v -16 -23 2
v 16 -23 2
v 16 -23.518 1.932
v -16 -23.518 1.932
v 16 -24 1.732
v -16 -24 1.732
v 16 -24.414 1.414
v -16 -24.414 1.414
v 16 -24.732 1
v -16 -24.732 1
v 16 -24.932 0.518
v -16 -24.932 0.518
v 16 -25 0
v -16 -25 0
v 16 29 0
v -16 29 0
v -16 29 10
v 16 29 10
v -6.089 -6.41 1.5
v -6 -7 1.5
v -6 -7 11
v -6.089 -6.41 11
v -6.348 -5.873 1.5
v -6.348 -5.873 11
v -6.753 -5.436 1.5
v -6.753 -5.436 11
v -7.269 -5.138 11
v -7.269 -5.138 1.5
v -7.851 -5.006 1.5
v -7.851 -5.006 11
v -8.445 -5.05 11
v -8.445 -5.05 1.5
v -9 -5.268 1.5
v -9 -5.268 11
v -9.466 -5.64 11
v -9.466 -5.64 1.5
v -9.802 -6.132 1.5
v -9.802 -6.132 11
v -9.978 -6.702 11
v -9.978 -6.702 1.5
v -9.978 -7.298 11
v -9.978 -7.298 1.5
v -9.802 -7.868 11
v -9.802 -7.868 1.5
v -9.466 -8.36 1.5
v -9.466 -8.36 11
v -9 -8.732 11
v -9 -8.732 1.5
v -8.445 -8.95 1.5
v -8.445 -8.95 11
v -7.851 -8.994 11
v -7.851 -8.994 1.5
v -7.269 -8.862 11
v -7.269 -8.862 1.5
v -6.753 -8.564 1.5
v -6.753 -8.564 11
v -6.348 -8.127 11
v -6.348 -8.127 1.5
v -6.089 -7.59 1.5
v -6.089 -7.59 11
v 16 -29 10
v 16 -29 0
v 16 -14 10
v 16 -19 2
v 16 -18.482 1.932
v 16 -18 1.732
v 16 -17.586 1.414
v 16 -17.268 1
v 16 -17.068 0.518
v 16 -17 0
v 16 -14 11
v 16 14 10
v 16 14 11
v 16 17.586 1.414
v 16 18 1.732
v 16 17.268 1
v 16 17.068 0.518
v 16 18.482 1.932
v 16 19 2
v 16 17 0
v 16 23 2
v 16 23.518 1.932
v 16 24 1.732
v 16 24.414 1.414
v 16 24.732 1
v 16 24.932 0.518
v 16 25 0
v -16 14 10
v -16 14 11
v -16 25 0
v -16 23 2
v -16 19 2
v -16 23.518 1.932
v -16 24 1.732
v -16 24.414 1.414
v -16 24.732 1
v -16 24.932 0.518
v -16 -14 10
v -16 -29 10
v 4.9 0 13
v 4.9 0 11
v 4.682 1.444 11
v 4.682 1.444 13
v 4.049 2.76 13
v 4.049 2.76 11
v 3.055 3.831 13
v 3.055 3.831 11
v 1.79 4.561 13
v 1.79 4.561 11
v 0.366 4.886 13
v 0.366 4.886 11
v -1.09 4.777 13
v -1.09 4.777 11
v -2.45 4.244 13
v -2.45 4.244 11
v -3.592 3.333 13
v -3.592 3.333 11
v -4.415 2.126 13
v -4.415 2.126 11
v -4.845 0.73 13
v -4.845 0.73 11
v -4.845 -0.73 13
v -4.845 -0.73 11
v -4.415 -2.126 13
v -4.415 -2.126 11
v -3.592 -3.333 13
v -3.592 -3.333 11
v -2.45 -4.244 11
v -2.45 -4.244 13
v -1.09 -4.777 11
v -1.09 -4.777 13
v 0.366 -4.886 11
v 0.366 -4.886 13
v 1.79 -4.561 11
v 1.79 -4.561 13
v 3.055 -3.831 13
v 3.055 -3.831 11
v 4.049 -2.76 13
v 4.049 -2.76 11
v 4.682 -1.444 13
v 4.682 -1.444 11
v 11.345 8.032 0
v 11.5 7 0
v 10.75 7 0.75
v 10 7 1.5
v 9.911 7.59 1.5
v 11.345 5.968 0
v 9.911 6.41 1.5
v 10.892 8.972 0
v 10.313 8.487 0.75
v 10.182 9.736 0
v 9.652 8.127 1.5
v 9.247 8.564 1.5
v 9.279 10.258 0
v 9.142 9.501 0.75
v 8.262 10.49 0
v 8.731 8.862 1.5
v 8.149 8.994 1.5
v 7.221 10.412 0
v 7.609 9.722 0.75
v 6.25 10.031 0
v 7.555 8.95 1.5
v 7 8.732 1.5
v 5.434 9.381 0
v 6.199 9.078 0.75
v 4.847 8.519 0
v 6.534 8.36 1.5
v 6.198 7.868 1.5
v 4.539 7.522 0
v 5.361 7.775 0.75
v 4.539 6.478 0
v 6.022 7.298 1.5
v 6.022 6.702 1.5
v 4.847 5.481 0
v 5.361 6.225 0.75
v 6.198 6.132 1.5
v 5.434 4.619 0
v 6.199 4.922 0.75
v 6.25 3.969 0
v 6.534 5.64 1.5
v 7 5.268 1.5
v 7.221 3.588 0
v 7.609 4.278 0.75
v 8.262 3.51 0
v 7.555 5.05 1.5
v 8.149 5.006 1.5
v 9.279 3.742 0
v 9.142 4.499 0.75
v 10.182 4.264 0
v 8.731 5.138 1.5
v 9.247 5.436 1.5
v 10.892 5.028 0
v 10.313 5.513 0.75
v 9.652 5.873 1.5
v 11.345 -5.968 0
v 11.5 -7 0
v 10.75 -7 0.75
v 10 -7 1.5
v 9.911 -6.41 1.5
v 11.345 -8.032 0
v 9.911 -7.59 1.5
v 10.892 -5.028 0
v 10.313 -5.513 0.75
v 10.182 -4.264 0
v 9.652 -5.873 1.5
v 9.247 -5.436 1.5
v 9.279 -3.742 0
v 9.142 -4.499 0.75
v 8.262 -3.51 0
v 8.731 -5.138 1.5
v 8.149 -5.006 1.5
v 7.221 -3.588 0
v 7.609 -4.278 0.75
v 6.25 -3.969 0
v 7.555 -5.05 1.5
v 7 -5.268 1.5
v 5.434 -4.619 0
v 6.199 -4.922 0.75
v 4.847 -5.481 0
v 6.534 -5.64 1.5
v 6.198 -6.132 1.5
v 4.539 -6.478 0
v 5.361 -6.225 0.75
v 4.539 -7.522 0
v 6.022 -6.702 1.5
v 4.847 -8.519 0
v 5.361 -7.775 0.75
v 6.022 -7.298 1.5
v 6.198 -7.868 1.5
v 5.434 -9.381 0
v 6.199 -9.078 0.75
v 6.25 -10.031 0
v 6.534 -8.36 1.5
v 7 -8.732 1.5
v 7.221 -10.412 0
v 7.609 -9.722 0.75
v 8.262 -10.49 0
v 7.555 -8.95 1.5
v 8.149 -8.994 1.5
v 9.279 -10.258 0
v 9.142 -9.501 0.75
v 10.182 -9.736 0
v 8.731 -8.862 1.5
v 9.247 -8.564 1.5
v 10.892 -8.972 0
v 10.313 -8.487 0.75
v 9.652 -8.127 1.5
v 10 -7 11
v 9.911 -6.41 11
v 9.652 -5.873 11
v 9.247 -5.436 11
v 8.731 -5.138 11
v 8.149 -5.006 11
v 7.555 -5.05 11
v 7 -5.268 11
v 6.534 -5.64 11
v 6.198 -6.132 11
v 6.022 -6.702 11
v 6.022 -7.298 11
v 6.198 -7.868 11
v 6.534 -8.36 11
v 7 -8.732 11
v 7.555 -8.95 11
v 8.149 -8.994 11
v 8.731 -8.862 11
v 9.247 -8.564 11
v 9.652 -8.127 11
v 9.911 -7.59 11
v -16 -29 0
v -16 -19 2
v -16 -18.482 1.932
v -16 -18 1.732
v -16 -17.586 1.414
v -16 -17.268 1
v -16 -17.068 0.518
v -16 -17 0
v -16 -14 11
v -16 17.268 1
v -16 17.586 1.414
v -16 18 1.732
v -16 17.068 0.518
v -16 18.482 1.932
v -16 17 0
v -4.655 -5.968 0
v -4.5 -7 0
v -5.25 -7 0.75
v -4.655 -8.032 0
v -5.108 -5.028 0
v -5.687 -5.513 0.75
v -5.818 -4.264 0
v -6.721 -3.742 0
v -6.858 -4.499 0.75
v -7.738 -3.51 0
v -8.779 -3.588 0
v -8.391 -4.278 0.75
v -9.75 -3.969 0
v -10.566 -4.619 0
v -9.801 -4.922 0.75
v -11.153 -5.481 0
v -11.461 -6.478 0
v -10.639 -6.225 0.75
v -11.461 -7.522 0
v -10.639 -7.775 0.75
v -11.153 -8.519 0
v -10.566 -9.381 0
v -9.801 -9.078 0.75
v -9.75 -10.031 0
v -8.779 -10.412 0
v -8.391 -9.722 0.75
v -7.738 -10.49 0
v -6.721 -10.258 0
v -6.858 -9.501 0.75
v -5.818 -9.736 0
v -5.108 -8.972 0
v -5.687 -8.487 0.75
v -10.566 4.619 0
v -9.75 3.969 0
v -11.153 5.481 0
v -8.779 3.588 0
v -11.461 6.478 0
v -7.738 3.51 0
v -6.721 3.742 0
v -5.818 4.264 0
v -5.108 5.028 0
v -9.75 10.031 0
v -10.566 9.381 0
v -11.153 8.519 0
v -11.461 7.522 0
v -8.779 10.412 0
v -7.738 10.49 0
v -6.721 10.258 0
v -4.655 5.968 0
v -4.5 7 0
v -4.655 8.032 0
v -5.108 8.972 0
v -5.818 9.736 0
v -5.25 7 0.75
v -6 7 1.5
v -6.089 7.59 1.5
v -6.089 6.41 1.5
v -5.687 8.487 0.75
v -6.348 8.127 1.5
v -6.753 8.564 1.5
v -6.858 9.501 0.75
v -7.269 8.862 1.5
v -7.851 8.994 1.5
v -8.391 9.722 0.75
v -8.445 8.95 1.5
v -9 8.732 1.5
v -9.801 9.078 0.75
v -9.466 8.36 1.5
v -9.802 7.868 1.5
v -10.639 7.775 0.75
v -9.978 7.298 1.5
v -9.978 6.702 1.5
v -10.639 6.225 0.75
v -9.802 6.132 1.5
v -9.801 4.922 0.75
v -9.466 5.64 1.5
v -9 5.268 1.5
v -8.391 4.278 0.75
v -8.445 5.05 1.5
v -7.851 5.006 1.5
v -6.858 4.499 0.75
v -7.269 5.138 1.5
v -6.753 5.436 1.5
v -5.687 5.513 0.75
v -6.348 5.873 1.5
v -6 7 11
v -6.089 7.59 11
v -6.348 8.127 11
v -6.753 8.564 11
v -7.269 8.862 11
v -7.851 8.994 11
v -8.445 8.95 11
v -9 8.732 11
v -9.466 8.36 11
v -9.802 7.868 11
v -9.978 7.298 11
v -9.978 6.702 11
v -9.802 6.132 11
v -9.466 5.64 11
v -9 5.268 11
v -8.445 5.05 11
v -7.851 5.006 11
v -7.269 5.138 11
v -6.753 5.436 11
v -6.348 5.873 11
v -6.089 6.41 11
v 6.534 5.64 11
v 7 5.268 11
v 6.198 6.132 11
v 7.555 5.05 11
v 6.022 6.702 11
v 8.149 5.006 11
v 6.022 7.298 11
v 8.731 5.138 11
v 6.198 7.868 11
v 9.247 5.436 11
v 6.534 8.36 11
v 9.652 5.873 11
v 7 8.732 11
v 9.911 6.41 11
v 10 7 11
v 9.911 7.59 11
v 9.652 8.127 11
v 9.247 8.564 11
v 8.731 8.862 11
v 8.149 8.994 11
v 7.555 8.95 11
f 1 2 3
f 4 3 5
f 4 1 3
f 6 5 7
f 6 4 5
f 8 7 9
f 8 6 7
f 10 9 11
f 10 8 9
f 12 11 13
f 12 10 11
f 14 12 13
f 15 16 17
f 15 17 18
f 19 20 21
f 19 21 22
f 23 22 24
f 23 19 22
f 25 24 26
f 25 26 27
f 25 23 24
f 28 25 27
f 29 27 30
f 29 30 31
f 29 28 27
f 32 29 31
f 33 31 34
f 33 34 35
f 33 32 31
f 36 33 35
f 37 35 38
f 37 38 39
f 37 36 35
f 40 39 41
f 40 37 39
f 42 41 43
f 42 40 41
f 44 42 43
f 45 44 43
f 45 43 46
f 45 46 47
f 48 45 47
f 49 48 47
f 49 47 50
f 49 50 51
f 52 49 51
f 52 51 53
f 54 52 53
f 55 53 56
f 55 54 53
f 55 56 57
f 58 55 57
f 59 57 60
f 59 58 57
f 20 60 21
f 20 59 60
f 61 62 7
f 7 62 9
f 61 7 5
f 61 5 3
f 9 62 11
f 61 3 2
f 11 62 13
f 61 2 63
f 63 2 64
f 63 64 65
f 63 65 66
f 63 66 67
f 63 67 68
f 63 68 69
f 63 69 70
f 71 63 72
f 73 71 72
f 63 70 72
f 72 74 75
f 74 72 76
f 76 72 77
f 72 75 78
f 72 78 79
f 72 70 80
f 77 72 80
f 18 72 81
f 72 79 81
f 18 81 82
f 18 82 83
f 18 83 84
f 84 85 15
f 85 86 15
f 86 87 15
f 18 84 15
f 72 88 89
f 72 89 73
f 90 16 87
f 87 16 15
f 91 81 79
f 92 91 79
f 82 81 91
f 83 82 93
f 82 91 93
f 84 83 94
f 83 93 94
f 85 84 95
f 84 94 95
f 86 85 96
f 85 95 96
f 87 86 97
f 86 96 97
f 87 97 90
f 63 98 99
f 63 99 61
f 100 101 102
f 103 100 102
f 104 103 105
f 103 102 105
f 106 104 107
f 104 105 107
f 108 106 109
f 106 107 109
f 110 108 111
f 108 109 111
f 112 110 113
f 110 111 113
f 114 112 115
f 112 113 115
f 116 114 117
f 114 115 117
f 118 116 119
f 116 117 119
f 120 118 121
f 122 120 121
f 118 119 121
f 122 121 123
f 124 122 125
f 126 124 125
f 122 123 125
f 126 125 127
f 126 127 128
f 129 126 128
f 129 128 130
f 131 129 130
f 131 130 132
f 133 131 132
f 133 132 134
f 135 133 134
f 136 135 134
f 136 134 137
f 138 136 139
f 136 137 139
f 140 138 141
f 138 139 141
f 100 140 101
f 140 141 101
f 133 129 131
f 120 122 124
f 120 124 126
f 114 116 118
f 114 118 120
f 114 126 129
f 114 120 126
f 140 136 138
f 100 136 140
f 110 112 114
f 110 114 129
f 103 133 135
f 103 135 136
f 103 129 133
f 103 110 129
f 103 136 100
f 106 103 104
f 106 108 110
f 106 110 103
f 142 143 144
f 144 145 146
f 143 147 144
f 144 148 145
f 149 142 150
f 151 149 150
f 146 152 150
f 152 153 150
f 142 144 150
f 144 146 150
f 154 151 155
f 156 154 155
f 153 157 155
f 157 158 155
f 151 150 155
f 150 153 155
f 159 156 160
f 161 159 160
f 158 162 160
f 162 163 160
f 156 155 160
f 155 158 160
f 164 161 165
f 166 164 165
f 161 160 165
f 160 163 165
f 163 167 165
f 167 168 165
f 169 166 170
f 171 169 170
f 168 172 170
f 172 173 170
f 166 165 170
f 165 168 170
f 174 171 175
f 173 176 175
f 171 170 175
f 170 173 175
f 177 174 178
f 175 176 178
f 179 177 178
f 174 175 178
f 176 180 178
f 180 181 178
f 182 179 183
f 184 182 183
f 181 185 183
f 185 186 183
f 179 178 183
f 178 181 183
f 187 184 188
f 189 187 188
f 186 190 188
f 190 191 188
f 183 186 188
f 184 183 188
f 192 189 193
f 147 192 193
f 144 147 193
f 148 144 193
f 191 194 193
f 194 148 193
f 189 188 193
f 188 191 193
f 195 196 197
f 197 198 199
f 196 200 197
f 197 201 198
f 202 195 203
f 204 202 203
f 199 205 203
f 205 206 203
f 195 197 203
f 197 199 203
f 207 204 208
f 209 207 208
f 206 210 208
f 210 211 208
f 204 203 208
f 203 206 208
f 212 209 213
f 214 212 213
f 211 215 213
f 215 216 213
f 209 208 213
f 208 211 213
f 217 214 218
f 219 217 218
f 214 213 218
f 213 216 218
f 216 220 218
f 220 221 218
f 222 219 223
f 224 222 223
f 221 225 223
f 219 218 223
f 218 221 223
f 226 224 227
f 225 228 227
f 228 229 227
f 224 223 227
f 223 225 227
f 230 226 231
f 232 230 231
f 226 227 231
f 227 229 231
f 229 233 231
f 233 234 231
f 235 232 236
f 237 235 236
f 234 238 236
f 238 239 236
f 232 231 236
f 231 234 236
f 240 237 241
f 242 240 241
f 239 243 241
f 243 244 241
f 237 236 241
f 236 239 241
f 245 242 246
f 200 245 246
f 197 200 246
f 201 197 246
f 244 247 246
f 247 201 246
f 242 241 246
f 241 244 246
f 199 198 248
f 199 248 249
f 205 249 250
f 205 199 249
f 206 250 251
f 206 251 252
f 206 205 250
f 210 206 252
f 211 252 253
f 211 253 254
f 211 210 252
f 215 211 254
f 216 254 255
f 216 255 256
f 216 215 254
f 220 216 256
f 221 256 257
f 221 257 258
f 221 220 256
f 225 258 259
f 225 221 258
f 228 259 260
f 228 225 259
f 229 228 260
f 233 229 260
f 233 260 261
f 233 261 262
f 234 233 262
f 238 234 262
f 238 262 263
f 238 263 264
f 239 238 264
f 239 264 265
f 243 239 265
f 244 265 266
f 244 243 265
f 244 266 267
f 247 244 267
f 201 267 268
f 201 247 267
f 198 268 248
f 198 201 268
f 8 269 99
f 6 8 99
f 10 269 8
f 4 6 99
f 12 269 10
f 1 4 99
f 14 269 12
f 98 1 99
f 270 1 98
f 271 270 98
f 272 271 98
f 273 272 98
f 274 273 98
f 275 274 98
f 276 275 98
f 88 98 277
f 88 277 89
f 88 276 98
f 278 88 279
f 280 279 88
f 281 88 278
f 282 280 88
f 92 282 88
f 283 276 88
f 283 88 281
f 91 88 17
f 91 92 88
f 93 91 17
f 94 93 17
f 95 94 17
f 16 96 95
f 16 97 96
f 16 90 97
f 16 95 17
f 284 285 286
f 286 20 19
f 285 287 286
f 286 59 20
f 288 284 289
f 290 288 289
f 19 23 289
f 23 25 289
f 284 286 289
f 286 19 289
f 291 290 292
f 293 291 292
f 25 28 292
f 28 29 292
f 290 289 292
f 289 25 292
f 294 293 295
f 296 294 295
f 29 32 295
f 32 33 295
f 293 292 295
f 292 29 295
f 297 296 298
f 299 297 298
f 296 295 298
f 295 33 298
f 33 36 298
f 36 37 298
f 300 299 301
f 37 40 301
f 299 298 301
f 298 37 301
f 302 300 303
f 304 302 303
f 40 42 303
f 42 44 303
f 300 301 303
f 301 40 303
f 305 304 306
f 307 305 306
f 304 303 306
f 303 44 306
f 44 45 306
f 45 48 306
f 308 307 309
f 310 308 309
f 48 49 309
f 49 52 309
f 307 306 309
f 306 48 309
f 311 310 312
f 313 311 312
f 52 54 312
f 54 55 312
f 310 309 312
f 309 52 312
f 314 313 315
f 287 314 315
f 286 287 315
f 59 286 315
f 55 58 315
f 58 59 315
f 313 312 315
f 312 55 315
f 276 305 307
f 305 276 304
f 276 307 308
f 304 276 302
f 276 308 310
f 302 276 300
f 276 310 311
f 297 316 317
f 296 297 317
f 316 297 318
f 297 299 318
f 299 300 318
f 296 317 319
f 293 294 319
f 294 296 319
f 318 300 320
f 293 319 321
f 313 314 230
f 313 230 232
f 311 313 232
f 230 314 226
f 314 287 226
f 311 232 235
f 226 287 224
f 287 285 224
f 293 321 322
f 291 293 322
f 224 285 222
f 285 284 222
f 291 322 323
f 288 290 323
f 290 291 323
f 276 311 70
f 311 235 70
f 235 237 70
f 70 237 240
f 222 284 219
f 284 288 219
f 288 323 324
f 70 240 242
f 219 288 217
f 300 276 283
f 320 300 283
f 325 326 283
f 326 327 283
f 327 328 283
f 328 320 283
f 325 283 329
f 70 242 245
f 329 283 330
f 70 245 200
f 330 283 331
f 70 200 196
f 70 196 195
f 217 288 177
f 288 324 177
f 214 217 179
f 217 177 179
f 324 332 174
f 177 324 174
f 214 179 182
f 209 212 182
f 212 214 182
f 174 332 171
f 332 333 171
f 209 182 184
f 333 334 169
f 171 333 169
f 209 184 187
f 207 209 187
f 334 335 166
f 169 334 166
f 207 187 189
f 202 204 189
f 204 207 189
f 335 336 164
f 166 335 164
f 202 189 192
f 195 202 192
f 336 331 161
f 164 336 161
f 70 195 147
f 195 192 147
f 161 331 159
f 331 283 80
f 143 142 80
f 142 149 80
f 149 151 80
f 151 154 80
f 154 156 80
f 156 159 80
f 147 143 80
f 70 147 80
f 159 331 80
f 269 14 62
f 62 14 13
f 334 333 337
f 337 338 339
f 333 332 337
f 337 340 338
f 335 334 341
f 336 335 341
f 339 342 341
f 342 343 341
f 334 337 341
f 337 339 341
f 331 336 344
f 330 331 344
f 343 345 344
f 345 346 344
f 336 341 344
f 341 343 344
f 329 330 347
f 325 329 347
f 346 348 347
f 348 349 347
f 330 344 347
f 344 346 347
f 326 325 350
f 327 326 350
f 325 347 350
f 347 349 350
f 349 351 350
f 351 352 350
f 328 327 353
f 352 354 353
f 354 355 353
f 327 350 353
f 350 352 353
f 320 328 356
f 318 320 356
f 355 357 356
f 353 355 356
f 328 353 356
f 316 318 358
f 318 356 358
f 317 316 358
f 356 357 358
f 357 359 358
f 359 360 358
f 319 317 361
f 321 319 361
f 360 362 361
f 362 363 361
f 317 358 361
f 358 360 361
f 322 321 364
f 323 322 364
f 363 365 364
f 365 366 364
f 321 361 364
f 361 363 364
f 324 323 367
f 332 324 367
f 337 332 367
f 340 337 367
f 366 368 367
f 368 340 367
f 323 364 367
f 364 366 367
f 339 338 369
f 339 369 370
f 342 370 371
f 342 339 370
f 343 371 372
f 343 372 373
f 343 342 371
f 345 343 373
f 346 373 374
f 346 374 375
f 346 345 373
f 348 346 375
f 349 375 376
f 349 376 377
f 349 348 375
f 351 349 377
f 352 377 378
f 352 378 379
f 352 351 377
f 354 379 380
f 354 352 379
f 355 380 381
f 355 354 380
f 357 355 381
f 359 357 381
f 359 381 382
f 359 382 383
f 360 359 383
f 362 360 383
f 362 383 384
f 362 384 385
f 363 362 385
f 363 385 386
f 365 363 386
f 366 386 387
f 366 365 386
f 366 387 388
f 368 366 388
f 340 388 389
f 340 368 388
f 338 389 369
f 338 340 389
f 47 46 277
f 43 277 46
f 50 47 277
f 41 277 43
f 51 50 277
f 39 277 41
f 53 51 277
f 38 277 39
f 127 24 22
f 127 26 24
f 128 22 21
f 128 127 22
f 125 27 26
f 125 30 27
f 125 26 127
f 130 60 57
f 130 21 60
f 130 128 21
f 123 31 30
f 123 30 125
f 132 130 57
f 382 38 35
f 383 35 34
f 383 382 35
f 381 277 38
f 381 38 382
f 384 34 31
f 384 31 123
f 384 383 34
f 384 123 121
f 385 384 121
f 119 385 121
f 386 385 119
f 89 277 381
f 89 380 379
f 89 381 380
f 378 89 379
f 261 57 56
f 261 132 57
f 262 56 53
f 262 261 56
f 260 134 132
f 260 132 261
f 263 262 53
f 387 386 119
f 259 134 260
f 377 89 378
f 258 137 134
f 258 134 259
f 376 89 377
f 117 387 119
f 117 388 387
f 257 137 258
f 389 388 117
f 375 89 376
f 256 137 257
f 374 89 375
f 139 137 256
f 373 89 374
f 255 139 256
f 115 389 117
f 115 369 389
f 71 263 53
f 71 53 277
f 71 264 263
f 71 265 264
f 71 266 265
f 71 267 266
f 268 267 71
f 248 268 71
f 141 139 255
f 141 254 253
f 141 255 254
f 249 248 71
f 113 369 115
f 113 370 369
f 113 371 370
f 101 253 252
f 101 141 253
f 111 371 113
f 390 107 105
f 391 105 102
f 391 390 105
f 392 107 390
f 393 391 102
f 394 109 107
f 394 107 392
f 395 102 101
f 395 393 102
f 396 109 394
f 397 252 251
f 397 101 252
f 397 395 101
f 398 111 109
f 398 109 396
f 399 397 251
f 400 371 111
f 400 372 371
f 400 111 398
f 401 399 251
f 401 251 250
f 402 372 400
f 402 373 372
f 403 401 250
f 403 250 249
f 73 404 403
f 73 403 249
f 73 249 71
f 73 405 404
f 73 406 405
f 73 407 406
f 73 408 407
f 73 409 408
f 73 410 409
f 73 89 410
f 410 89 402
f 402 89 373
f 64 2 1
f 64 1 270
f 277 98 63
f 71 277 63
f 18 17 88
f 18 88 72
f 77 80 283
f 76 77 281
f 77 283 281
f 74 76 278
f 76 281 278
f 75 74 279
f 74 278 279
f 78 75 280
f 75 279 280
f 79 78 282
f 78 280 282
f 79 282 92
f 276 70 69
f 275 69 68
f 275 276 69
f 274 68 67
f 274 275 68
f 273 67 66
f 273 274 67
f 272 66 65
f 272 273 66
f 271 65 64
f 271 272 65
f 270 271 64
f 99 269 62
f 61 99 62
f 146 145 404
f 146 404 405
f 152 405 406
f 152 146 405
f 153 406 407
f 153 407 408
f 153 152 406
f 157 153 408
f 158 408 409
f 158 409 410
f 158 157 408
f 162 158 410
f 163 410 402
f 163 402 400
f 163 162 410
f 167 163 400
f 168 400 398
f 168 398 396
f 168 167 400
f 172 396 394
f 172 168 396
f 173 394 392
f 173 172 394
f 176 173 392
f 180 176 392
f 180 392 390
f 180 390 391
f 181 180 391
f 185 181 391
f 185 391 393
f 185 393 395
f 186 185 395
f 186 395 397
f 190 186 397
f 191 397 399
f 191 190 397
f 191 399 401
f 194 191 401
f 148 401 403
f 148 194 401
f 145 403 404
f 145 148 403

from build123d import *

# Parameters (mm, degrees)
SKETCH_W      = 32
SKETCH_H      = 28
SKETCH_R      = 2
PAD_DEPTH     = 11
SKETCH001_R   = 4.9
PAD001_DEPTH  = 2
SKETCH002_W   = 32
SKETCH002_H   = 58
SKETCH002_W_2 = 25.648531
SKETCH002_H_2 = 22.342523
PAD002_DEPTH  = 10
POCKET_DEPTH  = 167.012111
CHAMFER_SIZE  = 1.5


with BuildPart() as part:
    # Sketch → Pad (new body)
    with BuildSketch(Plane.XY):
        Rectangle(SKETCH_W, SKETCH_H)
        with Locations((8, 7)):
            Circle(SKETCH_R, mode=Mode.SUBTRACT)
        with Locations((8, -7)):
            Circle(SKETCH_R, mode=Mode.SUBTRACT)
        with Locations((-8, -7)):
            Circle(SKETCH_R, mode=Mode.SUBTRACT)
        with Locations((-8, 7)):
            Circle(SKETCH_R, mode=Mode.SUBTRACT)
    extrude(amount=PAD_DEPTH)

    # Sketch001 (on Face10 of Pad) → Pad001 (join)
    with BuildSketch(Plane.XY.offset(11)):
        Circle(SKETCH001_R)
    extrude(amount=PAD001_DEPTH)

    # Sketch002 → Pad002 (join)
    with BuildSketch(Plane.XY):
        Rectangle(SKETCH002_W, SKETCH002_H)
        with Locations((-0.824266, 0.828739)):
            Rectangle(SKETCH002_W_2, SKETCH002_H_2, mode=Mode.SUBTRACT)
    extrude(amount=PAD002_DEPTH)

    # Sketch003 (on Face15 of Pad002) → Pocket (cut, through all)
    with BuildSketch(Plane(origin=(-16, 0, 0), x_dir=(0, -1, 0), z_dir=(-1, 0, 0))):
        with BuildLine():
            ThreePointArc((-23, 2), (-25, 0), (-23, -2))
            Line((-23, -2), (-19, -2))
            ThreePointArc((-19, -2), (-17, 0), (-19, 2))
            Line((-23, 2), (-19, 2))
        make_face()
    pocket = extrude(amount=-POCKET_DEPTH, mode=Mode.SUBTRACT)

    # Mirrored: Pocket across XZ
    add(pocket.mirror(Plane.XZ), mode=Mode.SUBTRACT)

    # Chamfer
    chamfer_edges = [part.edges().sort_by_distance(p)[0] for p in [
        (-10, 7, 0),
        (6, 7, 0),
        (6, -7, 0),
        (-10, -7, 0),
    ]]
    chamfer(chamfer_edges, length=CHAMFER_SIZE)


solid = part.part
